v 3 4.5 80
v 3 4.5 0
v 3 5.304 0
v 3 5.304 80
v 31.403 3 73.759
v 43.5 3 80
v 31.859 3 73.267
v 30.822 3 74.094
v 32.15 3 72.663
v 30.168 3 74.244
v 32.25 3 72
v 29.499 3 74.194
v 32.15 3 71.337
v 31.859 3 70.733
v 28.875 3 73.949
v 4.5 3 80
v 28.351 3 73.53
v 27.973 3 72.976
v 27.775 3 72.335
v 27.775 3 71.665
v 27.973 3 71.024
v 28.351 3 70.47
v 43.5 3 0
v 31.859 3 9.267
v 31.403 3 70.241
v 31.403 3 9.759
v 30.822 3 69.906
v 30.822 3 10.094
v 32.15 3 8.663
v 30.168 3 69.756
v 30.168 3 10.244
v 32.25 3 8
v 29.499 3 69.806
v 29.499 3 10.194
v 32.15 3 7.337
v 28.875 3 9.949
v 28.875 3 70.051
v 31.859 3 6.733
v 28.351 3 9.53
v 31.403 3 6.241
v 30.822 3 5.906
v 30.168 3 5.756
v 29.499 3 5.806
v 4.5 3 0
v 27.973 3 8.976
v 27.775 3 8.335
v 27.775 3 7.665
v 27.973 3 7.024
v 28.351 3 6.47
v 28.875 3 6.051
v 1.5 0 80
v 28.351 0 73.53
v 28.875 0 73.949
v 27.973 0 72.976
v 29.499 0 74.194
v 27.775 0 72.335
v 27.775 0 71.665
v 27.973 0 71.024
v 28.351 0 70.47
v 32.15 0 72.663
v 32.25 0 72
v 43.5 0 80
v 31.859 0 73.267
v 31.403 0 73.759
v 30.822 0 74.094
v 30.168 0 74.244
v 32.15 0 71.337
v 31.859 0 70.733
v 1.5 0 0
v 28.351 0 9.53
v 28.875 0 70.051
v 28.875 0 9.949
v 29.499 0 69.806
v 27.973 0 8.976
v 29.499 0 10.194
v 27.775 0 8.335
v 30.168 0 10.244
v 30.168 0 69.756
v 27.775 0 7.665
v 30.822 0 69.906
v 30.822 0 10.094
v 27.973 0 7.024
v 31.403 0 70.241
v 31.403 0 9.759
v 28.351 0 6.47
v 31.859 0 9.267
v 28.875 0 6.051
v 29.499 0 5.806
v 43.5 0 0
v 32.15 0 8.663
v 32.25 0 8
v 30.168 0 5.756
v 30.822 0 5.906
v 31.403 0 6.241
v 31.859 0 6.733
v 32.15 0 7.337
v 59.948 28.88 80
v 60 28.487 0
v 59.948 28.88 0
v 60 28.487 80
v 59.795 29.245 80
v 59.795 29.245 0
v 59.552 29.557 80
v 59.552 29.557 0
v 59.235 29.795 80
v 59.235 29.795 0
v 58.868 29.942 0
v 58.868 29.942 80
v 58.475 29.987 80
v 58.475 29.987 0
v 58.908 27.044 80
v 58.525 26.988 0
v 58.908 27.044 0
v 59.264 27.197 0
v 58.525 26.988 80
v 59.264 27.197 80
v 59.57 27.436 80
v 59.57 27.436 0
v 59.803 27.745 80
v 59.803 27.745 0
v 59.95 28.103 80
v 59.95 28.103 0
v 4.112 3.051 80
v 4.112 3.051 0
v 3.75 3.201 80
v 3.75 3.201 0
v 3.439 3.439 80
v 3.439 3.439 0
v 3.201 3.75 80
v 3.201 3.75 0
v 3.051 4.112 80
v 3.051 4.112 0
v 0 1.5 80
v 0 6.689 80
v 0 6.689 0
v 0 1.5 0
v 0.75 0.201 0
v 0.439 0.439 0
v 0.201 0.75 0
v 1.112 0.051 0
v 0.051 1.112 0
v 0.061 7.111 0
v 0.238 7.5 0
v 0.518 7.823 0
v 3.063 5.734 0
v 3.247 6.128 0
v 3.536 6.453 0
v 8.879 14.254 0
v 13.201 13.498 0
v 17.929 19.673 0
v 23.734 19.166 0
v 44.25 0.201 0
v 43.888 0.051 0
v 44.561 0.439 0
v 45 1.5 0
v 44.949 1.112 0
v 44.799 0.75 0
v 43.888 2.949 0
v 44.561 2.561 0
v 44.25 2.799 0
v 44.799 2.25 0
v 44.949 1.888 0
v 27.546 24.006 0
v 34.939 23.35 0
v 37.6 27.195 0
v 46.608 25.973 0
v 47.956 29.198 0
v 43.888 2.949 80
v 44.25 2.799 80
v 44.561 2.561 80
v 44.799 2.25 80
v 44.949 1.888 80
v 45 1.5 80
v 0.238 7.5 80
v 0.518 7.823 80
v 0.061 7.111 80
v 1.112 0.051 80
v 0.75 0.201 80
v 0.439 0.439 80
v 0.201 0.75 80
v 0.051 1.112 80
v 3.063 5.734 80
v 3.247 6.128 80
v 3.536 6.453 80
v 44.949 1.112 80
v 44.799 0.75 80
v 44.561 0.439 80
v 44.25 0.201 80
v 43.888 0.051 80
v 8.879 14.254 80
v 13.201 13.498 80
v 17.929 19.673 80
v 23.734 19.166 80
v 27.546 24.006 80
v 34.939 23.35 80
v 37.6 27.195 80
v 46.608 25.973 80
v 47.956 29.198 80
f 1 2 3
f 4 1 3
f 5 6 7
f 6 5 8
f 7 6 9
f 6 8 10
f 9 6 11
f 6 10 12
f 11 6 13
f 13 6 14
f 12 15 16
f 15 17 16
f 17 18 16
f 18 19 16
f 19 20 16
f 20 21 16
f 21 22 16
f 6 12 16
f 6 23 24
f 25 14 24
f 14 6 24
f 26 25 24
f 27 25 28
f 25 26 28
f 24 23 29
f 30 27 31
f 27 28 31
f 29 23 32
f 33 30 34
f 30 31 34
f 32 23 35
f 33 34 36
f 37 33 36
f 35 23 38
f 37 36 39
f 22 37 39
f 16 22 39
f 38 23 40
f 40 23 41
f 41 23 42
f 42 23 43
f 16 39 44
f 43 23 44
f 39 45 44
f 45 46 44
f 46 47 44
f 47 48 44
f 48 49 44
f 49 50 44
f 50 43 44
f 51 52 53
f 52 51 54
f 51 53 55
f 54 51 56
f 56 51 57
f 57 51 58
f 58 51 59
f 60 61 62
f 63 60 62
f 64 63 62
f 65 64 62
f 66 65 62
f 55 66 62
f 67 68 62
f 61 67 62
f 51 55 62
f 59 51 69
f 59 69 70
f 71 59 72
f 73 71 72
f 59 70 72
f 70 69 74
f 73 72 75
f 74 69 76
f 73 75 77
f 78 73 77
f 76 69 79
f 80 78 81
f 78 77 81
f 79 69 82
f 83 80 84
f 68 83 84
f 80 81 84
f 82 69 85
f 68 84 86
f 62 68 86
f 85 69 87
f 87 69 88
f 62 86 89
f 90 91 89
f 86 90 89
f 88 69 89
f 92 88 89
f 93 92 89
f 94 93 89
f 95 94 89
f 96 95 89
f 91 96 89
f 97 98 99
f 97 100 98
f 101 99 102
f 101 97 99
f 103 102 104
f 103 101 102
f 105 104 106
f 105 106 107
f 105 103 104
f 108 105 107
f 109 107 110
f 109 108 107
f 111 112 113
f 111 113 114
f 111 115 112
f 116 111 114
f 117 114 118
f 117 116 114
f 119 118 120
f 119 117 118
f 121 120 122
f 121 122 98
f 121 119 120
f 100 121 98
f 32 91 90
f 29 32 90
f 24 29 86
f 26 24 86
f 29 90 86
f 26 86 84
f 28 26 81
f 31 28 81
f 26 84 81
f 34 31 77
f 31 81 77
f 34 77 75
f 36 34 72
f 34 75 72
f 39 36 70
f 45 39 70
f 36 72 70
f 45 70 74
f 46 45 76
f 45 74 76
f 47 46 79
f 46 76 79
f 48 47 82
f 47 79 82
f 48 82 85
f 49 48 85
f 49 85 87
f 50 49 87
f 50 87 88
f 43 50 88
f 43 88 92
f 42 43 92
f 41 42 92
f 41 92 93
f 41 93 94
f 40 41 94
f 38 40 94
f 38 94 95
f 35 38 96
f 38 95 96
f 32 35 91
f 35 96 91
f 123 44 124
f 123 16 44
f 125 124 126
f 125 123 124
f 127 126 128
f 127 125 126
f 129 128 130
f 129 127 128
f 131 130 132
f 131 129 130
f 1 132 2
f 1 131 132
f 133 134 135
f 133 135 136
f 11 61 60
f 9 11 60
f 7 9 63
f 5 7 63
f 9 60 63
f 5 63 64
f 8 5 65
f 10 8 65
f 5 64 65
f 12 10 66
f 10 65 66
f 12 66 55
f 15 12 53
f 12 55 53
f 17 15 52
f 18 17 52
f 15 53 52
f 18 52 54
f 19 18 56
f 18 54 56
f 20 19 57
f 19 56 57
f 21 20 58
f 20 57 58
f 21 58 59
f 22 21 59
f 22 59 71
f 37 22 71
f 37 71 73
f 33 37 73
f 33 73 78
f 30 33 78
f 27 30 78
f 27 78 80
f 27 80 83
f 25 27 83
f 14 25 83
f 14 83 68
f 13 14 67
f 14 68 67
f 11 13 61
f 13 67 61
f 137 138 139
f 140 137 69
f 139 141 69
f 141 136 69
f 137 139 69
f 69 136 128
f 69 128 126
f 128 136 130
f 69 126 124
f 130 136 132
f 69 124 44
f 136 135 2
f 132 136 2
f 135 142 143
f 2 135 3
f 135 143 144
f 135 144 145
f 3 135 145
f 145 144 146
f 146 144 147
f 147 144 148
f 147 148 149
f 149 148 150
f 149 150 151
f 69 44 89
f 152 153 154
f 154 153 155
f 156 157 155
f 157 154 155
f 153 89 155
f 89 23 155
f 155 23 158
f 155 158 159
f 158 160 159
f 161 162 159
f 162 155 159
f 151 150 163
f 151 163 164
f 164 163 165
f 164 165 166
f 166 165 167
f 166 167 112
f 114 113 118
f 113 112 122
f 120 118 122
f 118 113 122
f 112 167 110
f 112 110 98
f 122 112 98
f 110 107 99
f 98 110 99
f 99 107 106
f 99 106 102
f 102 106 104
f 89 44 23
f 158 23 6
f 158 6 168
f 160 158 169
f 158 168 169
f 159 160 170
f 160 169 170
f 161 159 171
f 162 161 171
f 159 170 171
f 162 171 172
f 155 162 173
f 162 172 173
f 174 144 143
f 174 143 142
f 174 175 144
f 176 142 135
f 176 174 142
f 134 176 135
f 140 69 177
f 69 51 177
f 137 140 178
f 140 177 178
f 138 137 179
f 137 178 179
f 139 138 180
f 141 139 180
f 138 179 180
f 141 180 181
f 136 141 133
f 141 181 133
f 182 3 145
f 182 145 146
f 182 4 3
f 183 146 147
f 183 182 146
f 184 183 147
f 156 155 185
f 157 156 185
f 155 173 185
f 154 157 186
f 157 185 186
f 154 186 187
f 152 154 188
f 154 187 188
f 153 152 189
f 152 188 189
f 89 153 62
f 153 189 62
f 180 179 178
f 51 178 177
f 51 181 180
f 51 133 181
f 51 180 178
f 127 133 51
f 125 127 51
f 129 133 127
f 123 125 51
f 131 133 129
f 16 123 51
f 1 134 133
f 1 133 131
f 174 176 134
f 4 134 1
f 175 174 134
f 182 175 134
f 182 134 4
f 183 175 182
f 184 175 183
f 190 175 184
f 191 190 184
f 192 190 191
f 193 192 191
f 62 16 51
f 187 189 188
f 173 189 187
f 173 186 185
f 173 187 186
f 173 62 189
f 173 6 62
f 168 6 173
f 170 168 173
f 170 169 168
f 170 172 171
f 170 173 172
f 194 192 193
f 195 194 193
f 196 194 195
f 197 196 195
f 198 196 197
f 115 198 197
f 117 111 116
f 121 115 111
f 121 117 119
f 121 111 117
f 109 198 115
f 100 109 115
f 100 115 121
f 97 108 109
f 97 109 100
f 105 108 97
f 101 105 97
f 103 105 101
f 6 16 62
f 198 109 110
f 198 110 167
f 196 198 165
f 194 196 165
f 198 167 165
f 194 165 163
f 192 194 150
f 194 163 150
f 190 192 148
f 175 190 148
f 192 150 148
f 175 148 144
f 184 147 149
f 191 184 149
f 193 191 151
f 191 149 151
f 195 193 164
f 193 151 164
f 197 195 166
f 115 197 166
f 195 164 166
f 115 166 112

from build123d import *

# Parameters (mm, degrees)
F1_DEPTH = 80
F2_R     = 2.25
F3_DEPTH = 3
F4_R     = 1.49999


# Not quite as in the source:
# - a fillet or chamfer is up to 0.001 mm smaller than in the source, because OpenCascade refuses the exact size
# - a feature names something its author has since deleted; it is built from what else it names


with BuildPart() as f1:
    # F0 (on Top) → F1 (new body)
    with BuildSketch(Plane.XY):
        with BuildLine():
            Line((45, 3), (3, 3))
            Line((3, 3), (3, 6))
            ThreePointArc((3, 6), (29.6273152762, 21.5830013932), (60, 27))
            Line((60, 27), (60, 30))
            ThreePointArc((60, 30), (27.9372056463, 24.1546059211), (0, 7.3705672421))
            Line((0, 7.3705672421), (0, 0))
            Line((0, 0), (45, 0))
            Line((45, 0), (45, 3))
        make_face()
    extrude(amount=F1_DEPTH)

    # F2 (on face) → F3 (cut, through all)
    with BuildSketch(Plane.XZ):
        with Locations((30, 72)):
            Circle(F2_R)
        with Locations((30, 8)):
            Circle(F2_R)
    extrude(amount=-F3_DEPTH, mode=Mode.SUBTRACT)

    # F4 (radius 1.5 in the source; OpenCascade refuses exactly that, so slightly less here)
    f4_edges = [f1.edges().sort_by_distance(p)[0] for p in [
        (45, 0, 40),
        (45, 3, 40),
        (0, 0, 40),
        (0, 7.370567, 40),
        (60, 30, 40),
        (60, 27, 40),
        (3, 3, 40),
        (3, 6, 40),
    ]]
    fillet(f4_edges, radius=F4_R)


solid = f1.part
